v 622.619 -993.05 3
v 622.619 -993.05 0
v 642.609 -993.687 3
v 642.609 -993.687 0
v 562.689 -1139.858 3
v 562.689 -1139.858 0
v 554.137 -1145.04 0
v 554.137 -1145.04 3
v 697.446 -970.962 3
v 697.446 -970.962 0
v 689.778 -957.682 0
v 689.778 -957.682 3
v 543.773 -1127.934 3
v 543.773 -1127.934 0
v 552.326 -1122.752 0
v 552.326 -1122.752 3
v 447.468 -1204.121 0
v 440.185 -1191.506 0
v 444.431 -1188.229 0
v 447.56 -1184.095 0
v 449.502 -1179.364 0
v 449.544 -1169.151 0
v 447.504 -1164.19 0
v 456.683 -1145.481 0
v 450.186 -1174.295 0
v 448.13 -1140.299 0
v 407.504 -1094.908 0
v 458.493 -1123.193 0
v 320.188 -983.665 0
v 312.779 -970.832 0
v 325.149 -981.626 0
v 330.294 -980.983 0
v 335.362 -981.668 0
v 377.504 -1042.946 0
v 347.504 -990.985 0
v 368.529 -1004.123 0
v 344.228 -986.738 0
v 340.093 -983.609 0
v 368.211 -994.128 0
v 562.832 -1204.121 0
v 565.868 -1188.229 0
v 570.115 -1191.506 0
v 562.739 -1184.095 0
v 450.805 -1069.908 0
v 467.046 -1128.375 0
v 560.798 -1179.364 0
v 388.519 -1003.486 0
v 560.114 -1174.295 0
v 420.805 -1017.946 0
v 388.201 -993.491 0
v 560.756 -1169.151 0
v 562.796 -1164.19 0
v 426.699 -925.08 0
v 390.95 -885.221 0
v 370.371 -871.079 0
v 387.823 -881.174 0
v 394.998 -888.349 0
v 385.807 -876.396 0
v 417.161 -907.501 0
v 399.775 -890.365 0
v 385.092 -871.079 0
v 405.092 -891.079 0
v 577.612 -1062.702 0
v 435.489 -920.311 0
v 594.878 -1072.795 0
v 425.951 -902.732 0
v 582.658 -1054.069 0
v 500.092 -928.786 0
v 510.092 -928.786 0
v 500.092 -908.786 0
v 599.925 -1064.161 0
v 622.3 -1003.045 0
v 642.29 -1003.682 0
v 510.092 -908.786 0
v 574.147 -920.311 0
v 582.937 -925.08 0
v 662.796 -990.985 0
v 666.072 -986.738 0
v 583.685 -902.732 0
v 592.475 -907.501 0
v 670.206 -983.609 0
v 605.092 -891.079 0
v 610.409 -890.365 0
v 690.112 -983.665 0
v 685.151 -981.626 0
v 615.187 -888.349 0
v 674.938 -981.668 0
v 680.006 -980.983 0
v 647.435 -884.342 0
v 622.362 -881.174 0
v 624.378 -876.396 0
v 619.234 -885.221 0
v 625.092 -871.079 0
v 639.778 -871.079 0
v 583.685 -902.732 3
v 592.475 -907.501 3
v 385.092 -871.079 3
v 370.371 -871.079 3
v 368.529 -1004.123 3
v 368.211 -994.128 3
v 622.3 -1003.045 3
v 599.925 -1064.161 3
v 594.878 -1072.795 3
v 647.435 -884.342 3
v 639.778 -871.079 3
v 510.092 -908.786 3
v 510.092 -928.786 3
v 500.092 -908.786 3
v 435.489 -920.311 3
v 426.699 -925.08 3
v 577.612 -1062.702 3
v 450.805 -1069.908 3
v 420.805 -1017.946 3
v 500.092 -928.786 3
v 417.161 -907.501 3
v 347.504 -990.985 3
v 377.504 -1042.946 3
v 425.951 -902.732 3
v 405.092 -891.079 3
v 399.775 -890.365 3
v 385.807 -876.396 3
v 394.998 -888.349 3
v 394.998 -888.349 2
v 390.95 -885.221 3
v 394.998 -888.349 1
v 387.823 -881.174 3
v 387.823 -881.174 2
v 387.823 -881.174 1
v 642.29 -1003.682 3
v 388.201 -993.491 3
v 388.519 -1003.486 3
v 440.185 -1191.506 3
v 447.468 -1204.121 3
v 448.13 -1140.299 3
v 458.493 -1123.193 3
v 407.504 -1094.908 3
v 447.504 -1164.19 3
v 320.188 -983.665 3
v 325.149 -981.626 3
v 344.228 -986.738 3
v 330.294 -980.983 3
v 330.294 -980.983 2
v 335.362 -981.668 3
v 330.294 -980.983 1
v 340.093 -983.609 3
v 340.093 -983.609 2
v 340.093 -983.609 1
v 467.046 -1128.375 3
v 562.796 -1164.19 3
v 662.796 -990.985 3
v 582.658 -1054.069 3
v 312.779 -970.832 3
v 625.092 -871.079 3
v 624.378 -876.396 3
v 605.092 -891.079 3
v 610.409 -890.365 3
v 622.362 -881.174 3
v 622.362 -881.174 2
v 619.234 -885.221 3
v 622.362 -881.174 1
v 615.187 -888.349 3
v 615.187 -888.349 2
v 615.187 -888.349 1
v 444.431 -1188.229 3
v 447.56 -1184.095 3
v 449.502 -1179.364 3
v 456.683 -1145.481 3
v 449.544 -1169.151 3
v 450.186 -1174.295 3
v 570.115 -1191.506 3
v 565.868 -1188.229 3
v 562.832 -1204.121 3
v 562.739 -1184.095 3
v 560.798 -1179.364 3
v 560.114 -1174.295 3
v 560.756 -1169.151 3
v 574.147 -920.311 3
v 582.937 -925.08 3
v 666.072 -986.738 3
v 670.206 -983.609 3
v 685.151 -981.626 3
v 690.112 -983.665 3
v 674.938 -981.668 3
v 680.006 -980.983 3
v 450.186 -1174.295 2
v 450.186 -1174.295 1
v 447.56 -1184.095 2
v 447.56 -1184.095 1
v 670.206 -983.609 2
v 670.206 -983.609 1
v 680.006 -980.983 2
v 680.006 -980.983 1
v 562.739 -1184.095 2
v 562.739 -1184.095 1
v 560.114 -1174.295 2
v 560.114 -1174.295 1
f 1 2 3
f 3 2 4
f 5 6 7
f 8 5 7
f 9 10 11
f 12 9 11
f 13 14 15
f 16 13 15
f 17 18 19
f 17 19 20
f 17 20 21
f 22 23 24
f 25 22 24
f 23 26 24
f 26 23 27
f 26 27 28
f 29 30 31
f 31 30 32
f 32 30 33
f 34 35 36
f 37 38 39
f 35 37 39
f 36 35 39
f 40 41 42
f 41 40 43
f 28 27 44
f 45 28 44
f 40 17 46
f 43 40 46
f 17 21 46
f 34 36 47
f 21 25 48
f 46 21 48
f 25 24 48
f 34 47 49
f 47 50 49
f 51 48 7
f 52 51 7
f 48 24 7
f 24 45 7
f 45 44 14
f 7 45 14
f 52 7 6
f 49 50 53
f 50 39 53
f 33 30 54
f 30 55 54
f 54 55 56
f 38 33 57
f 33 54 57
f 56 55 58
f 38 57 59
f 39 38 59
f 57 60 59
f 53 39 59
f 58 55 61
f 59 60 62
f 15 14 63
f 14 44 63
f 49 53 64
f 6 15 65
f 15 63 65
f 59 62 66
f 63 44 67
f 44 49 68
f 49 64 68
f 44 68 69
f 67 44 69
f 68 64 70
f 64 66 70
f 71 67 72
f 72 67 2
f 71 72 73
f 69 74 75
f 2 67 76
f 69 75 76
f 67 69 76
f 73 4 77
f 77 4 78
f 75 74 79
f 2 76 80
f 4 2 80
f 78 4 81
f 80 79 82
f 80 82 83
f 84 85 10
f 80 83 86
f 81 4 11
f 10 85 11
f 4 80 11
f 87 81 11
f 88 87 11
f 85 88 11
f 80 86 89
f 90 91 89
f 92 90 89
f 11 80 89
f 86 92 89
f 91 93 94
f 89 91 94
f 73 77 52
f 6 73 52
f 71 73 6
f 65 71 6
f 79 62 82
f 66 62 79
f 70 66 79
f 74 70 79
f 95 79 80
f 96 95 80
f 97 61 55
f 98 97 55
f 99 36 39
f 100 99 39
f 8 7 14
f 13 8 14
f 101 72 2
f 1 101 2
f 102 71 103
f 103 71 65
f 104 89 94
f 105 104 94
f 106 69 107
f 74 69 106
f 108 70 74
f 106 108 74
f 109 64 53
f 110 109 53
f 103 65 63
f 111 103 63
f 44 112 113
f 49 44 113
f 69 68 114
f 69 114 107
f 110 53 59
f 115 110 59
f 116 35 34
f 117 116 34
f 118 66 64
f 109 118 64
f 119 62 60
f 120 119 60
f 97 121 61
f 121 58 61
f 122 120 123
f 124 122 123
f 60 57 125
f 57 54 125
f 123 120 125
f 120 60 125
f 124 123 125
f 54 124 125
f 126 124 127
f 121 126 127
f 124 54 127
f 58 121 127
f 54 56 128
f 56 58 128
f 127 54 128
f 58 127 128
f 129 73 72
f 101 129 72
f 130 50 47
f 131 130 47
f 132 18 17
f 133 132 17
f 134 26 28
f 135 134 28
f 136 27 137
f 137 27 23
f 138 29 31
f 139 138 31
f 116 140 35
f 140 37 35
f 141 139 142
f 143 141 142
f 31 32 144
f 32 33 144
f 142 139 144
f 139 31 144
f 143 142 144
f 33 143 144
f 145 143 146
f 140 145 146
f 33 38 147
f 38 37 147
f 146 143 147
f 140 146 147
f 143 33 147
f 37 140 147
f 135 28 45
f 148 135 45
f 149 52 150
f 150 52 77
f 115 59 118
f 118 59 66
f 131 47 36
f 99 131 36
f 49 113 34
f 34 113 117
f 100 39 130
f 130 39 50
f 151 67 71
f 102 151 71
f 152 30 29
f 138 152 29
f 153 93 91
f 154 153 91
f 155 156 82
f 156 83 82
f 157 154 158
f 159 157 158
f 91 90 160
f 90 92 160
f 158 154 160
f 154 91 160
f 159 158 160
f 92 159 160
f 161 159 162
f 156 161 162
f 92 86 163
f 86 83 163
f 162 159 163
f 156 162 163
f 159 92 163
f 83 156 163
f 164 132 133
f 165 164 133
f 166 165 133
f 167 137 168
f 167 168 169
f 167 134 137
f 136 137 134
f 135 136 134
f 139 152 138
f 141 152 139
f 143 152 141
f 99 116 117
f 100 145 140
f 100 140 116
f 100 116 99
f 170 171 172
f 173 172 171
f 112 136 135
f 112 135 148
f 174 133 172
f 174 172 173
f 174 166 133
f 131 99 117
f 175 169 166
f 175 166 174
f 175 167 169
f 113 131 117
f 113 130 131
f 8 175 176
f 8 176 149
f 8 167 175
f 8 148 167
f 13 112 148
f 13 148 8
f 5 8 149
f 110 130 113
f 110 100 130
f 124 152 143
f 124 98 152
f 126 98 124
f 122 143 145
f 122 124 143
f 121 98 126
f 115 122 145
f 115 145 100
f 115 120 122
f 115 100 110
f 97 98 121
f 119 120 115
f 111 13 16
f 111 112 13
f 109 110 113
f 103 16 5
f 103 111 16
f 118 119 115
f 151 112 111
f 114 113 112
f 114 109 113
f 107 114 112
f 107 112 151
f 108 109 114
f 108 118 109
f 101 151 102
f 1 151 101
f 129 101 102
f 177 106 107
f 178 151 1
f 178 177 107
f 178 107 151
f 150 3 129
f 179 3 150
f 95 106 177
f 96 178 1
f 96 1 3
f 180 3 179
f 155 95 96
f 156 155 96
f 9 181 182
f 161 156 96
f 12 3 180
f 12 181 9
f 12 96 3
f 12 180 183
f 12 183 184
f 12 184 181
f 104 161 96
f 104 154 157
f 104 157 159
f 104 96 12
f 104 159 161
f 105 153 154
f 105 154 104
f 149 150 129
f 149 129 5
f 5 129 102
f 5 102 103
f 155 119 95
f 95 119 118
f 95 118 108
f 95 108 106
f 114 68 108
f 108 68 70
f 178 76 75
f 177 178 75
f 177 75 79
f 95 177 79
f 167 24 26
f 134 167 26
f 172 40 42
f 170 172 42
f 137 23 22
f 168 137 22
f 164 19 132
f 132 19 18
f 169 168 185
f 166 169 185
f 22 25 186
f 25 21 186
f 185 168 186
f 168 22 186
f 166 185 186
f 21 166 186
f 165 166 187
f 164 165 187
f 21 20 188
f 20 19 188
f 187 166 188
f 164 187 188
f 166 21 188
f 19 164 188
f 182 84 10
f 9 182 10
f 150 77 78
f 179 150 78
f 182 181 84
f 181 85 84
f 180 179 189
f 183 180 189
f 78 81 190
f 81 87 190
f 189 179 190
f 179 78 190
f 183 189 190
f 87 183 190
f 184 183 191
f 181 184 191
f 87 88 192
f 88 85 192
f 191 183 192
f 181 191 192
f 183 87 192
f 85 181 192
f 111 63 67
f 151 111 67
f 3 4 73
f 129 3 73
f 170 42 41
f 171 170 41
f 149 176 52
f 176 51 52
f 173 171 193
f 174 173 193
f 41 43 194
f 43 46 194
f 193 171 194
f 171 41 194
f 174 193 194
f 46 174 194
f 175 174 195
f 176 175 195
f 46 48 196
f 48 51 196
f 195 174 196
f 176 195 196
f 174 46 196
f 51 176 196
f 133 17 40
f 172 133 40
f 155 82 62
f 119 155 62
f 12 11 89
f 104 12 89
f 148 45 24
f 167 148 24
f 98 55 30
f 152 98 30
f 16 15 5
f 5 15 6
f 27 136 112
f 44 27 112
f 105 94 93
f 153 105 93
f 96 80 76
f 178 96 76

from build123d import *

# Parameters (mm, degrees)
MODEL_W                 = 10.000078668
MODEL_H                 = 19.99998508
BOSS_EXTRU_1_DEPTH      = 3
ENL_V_MAT_EXTRU_1_DEPTH = 10


with BuildPart() as part:
    # Model → Boss.-Extru.1 (new body)
    with BuildSketch(Plane.XY):
        with BuildLine():
            Line((347.504229039, -990.984743501), (447.504154456, -1164.189847387))
            add(Edge.make_bspline(
                [(447.504154456, -1164.189847387), (453.026125757, -1173.754121475), (449.749150931, -1185.983779814), (440.184876843, -1191.505837242)],
                knots=[1, 1, 1, 1, 2, 2, 2, 2], degree=3))
            Line((440.184876843, -1191.505837242), (447.468153212, -1204.120743383))
            Line((447.468153212, -1204.120743383), (462.904937066, -1204.120743383))
            Line((462.904937066, -1204.120743383), (547.394870334, -1204.120743383))
            Line((547.394870334, -1204.120743383), (562.831654188, -1204.120743383))
            Line((562.831654188, -1204.120743383), (570.114930554, -1191.505837241))
            add(Edge.make_bspline(
                [(570.114930554, -1191.505837241), (560.550656465, -1185.983779815), (557.273681638, -1173.754121476), (562.795652937, -1164.189847387)],
                knots=[7, 7, 7, 7, 8, 8, 8, 8], degree=3))
            Line((562.795652937, -1164.189847387), (662.795578323, -990.984743483))
            add(Edge.make_bspline(
                [(662.795578323, -990.984743483), (668.317549622, -981.420469394), (680.547294088, -978.143580694), (690.111568177, -983.665465865)],
                knots=[9, 9, 9, 9, 10, 10, 10, 10], degree=3))
            Line((690.111568177, -983.665465865), (697.445659701, -970.962451406))
            Line((697.445659701, -970.962451406), (689.778082931, -957.6818667))
            Line((689.778082931, -957.6818667), (647.435103324, -884.341812722))
            Line((647.435103324, -884.341812722), (639.77820635, -871.079314757))
            Line((639.77820635, -871.079314757), (625.092281057, -871.079314757))
            add(Edge.make_bspline(
                [(625.092281057, -871.079314757), (625.092281058, -882.124979905), (616.137961126, -891.079299838), (605.092295979, -891.079299839)],
                knots=[17, 17, 17, 17, 18, 18, 18, 18], degree=3))
            Line((605.092295979, -891.079299839), (405.092272921, -891.079299839))
            add(Edge.make_bspline(
                [(405.092272921, -891.079299839), (394.046607773, -891.07929984), (385.09228784, -882.124979908), (385.092287839, -871.079314761)],
                knots=[19, 19, 19, 19, 20, 20, 20, 20], degree=3))
            Line((385.092287839, -871.079314761), (370.370533553, -871.079314761))
            Line((370.370533553, -871.079314761), (312.778700066, -970.831623929))
            Line((312.778700066, -970.831623929), (320.188239184, -983.665465888))
            add(Edge.make_bspline(
                [(320.188239184, -983.665465888), (329.752513272, -978.143494587), (341.982257738, -981.420469413), (347.504229039, -990.984743501)],
                knots=[23, 23, 23, 23, 24, 24, 24, 24], degree=3))
        make_face()
        Polygon((622.618702509, -993.05007822), (642.608524558, -993.687248628), (642.290025481, -1003.682159653), (622.300031178, -1003.044989244), align=None, mode=Mode.SUBTRACT)
        Polygon((594.878104643, -1072.794736968), (577.611630575, -1062.701812979), (582.658178697, -1054.068575945), (599.924652765, -1064.161499934), align=None, mode=Mode.SUBTRACT)
        Polygon((583.685161648, -902.731560157), (592.474806017, -907.50051971), (582.937059165, -925.079722321), (574.147414796, -920.310848895), align=None, mode=Mode.SUBTRACT)
        Polygon((552.326007751, -1122.752411126), (562.689371739, -1139.857999232), (554.136577686, -1145.039681226), (543.773213697, -1127.93409312), align=None, mode=Mode.SUBTRACT)
        with Locations((505.092198326, -918.785791257)):
            Rectangle(MODEL_W, MODEL_H, mode=Mode.SUBTRACT)
        Polygon((458.493147779, -1123.193383356), (467.045941833, -1128.375065349), (456.682577848, -1145.480653457), (448.129783794, -1140.298971465), align=None, mode=Mode.SUBTRACT)
        Polygon((425.950948052, -902.731560171), (435.488694907, -920.310848907), (426.699050539, -925.079722335), (417.161303684, -907.500519726), align=None, mode=Mode.SUBTRACT)
        Polygon((428.161149075, -1054.509548181), (433.207697199, -1063.142785214), (415.941223133, -1073.235709206), (410.894675009, -1064.602472173), align=None, mode=Mode.SUBTRACT)
        Polygon((388.200625252, -993.491050463), (388.519124331, -1003.485961487), (368.529302282, -1004.123131899), (368.210803204, -994.128220875), align=None, mode=Mode.SUBTRACT)
    extrude(amount=BOSS_EXTRU_1_DEPTH)

    # Esquisse2 → Enlèv. mat.-Extru.1 (cut)
    with BuildSketch(Plane.XY.offset(3)):
        Polygon((377.504209253, -1042.946279151), (407.504189467, -1094.907814801), (450.805469176, -1069.90783129), (420.805488962, -1017.946295639), align=None)
    extrude(amount=-ENL_V_MAT_EXTRU_1_DEPTH, mode=Mode.SUBTRACT)


solid = part.part
